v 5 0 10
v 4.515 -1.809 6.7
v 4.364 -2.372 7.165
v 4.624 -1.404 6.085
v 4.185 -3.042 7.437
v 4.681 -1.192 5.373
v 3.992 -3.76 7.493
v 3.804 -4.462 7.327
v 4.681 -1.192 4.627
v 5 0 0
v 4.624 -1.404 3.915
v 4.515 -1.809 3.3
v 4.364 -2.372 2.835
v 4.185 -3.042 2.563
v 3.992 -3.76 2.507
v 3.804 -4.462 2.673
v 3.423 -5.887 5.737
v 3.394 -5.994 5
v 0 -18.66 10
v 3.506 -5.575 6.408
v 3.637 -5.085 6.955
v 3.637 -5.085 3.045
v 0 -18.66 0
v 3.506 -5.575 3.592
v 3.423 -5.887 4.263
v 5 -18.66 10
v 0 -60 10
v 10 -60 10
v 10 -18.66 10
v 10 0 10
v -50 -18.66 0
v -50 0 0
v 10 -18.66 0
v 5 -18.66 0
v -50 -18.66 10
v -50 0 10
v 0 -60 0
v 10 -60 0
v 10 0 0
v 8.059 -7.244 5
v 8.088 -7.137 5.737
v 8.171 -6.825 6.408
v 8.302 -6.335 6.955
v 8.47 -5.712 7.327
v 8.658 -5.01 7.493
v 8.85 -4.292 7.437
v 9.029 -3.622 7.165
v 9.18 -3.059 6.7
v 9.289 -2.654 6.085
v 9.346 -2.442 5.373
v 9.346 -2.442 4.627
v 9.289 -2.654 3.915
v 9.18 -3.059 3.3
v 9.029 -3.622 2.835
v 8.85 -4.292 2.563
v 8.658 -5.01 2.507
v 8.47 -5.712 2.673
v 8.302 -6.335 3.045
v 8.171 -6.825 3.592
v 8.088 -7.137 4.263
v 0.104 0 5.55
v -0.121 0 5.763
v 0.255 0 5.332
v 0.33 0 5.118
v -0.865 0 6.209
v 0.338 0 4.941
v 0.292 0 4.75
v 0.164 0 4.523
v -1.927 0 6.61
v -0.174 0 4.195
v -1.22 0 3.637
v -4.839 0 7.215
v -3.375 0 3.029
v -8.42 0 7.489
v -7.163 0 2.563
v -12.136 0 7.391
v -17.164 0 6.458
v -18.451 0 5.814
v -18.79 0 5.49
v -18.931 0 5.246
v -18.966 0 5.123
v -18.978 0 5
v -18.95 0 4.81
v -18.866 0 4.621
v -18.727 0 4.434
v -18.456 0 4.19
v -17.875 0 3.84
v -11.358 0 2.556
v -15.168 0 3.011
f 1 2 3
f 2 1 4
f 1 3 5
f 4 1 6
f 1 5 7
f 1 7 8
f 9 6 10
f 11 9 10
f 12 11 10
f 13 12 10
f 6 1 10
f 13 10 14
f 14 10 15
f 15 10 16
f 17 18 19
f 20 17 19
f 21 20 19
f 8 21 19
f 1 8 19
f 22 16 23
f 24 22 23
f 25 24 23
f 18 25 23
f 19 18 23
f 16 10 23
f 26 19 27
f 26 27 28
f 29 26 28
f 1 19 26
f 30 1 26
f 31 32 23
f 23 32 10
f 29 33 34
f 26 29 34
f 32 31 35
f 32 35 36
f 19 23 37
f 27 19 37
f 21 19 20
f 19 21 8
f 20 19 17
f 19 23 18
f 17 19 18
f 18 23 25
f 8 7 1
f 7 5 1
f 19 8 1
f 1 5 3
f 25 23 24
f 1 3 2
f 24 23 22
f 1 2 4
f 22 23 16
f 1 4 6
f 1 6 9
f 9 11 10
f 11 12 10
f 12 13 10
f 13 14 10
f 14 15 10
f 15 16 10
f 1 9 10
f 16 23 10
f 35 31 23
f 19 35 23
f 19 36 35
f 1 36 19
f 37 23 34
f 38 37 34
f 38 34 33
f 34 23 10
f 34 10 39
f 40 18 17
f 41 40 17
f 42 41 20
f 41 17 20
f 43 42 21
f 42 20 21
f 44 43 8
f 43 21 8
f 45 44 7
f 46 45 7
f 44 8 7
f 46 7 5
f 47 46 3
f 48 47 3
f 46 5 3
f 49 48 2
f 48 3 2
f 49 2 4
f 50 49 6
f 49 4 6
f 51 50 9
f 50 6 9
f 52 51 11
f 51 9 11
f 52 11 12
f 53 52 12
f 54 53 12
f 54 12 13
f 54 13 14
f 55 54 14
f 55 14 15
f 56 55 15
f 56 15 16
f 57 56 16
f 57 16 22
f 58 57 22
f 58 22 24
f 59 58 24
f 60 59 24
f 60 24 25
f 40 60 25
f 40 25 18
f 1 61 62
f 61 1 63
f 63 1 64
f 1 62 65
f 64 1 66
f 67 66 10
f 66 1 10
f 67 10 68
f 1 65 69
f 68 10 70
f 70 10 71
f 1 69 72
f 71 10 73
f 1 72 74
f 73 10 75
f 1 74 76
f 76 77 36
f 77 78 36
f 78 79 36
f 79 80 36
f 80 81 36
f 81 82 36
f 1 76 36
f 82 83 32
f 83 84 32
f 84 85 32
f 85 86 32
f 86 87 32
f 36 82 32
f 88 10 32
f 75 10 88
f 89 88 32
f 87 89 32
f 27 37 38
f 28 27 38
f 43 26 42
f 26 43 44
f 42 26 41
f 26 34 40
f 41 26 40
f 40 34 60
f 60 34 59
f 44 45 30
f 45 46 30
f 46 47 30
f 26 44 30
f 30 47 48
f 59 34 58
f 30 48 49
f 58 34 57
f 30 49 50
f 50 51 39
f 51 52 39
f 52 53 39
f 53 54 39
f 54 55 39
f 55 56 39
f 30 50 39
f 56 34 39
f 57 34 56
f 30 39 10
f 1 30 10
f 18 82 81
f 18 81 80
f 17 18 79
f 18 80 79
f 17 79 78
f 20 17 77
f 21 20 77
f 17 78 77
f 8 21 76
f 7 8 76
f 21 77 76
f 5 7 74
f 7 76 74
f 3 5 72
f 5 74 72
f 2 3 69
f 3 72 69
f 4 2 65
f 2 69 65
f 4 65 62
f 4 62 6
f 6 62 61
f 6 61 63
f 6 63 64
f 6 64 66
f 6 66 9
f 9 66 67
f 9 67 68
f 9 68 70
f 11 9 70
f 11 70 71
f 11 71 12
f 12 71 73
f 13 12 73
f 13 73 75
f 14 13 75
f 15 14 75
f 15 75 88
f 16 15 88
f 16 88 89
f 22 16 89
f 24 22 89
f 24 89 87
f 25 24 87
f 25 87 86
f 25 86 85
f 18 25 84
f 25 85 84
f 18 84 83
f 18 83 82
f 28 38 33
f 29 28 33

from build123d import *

# Parameters (mm, degrees)
F1_DEPTH = 10
F0_W     = 50
F0_H     = 18.660254
F2_DEPTH = 10
F4_D     = 5
F4_2_D   = 5


with BuildPart() as f1:
    # F0 (on Top) → F1 (new body)
    with BuildSketch(Plane.XY):
        Polygon((10, 0), (5, 0), (0, -18.660254), (0, -60), (10, -60), (10, -18.660254), (5, -18.660254), align=None)
    extrude(amount=F1_DEPTH)

    # F4 (through all)
    with Locations(Plane(origin=(9.330127, -2.5, 0), x_dir=(0.258819, 0.965926, 0), z_dir=(0.965926, -0.258819, 0))):
        with Locations((-2.41181, 5)):
            Hole(F4_D / 2)


with BuildPart() as f2:
    # F0 (on Top) → F2 (new body)
    with BuildSketch(Plane.XY):
        with Locations((-25, -9.330127)):
            Rectangle(F0_W, F0_H)
        Polygon((5, 0), (0, 0), (0, -18.660254), align=None)
    extrude(amount=F2_DEPTH)

    # F4#2 (through all)
    with Locations(Plane(origin=(9.330127, -2.5, 0), x_dir=(0.258819, 0.965926, 0), z_dir=(0.965926, -0.258819, 0))):
        with Locations((-2.41181, 5)):
            Hole(F4_2_D / 2)


solid = Compound([f1.part, f2.part])
